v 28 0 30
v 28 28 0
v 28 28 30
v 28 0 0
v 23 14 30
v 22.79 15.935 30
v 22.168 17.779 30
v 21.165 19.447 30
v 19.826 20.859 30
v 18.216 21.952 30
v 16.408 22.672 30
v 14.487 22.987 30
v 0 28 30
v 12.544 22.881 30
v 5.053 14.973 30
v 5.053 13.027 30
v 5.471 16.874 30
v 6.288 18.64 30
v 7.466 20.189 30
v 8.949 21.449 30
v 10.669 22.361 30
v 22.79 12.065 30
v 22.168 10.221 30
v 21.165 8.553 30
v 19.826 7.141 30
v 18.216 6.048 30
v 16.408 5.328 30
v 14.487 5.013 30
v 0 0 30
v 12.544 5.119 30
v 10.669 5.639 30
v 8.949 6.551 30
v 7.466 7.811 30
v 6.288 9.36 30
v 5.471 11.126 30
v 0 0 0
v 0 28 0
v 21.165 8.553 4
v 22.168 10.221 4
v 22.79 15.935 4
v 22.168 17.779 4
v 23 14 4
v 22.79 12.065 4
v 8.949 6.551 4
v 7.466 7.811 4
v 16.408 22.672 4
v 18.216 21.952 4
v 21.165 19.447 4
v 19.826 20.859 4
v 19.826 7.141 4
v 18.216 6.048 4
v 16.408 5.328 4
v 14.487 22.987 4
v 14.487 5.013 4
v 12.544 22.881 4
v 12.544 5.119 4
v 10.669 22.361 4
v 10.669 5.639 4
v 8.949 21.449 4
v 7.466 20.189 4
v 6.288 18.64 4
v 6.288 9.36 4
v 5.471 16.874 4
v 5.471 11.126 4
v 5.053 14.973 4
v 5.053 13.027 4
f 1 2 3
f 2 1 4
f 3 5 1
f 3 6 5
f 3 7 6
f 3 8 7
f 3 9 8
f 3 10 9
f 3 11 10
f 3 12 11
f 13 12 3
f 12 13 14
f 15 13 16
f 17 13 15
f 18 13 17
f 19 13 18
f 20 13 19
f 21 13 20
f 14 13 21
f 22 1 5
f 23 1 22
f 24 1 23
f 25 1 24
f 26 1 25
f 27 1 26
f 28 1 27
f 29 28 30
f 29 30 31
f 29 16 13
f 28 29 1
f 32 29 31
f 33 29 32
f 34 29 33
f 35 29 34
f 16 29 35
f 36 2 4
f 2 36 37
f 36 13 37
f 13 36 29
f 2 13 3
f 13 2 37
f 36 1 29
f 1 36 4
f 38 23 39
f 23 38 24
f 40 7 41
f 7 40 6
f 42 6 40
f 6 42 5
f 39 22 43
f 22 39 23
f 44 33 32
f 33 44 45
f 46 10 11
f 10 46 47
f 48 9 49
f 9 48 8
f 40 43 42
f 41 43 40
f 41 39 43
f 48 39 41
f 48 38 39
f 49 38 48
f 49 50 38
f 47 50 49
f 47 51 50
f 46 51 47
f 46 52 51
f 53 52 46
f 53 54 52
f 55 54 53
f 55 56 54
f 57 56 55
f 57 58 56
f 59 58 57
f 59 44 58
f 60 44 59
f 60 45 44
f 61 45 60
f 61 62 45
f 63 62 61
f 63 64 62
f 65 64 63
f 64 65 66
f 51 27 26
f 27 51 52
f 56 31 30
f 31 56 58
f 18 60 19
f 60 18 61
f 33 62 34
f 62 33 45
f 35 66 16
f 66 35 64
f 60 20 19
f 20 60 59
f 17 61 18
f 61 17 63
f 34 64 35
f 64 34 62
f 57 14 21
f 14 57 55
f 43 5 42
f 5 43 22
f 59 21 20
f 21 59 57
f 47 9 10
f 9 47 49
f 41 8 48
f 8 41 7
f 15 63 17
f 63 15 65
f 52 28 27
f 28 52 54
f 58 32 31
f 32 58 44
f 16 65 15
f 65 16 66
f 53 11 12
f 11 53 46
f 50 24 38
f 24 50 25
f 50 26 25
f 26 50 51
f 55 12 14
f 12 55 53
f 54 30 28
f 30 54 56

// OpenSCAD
screwdriverDiameter=18;
plugBack=8;
plugDepth=5;
plugFront=3;
plugWidth=11;
plugHeight=3;
hangerHeight=30;
hangerWalls=5;

width=18+(hangerWalls*2);
depth=width;
height=hangerHeight;

difference(){
    union(){
        cube([width,depth,height]);
    }
    union(){
        translate([width/2,depth/2,plugHeight+1]) cylinder(d=screwdriverDiameter,h=hangerHeight-plugHeight);
    }
}
